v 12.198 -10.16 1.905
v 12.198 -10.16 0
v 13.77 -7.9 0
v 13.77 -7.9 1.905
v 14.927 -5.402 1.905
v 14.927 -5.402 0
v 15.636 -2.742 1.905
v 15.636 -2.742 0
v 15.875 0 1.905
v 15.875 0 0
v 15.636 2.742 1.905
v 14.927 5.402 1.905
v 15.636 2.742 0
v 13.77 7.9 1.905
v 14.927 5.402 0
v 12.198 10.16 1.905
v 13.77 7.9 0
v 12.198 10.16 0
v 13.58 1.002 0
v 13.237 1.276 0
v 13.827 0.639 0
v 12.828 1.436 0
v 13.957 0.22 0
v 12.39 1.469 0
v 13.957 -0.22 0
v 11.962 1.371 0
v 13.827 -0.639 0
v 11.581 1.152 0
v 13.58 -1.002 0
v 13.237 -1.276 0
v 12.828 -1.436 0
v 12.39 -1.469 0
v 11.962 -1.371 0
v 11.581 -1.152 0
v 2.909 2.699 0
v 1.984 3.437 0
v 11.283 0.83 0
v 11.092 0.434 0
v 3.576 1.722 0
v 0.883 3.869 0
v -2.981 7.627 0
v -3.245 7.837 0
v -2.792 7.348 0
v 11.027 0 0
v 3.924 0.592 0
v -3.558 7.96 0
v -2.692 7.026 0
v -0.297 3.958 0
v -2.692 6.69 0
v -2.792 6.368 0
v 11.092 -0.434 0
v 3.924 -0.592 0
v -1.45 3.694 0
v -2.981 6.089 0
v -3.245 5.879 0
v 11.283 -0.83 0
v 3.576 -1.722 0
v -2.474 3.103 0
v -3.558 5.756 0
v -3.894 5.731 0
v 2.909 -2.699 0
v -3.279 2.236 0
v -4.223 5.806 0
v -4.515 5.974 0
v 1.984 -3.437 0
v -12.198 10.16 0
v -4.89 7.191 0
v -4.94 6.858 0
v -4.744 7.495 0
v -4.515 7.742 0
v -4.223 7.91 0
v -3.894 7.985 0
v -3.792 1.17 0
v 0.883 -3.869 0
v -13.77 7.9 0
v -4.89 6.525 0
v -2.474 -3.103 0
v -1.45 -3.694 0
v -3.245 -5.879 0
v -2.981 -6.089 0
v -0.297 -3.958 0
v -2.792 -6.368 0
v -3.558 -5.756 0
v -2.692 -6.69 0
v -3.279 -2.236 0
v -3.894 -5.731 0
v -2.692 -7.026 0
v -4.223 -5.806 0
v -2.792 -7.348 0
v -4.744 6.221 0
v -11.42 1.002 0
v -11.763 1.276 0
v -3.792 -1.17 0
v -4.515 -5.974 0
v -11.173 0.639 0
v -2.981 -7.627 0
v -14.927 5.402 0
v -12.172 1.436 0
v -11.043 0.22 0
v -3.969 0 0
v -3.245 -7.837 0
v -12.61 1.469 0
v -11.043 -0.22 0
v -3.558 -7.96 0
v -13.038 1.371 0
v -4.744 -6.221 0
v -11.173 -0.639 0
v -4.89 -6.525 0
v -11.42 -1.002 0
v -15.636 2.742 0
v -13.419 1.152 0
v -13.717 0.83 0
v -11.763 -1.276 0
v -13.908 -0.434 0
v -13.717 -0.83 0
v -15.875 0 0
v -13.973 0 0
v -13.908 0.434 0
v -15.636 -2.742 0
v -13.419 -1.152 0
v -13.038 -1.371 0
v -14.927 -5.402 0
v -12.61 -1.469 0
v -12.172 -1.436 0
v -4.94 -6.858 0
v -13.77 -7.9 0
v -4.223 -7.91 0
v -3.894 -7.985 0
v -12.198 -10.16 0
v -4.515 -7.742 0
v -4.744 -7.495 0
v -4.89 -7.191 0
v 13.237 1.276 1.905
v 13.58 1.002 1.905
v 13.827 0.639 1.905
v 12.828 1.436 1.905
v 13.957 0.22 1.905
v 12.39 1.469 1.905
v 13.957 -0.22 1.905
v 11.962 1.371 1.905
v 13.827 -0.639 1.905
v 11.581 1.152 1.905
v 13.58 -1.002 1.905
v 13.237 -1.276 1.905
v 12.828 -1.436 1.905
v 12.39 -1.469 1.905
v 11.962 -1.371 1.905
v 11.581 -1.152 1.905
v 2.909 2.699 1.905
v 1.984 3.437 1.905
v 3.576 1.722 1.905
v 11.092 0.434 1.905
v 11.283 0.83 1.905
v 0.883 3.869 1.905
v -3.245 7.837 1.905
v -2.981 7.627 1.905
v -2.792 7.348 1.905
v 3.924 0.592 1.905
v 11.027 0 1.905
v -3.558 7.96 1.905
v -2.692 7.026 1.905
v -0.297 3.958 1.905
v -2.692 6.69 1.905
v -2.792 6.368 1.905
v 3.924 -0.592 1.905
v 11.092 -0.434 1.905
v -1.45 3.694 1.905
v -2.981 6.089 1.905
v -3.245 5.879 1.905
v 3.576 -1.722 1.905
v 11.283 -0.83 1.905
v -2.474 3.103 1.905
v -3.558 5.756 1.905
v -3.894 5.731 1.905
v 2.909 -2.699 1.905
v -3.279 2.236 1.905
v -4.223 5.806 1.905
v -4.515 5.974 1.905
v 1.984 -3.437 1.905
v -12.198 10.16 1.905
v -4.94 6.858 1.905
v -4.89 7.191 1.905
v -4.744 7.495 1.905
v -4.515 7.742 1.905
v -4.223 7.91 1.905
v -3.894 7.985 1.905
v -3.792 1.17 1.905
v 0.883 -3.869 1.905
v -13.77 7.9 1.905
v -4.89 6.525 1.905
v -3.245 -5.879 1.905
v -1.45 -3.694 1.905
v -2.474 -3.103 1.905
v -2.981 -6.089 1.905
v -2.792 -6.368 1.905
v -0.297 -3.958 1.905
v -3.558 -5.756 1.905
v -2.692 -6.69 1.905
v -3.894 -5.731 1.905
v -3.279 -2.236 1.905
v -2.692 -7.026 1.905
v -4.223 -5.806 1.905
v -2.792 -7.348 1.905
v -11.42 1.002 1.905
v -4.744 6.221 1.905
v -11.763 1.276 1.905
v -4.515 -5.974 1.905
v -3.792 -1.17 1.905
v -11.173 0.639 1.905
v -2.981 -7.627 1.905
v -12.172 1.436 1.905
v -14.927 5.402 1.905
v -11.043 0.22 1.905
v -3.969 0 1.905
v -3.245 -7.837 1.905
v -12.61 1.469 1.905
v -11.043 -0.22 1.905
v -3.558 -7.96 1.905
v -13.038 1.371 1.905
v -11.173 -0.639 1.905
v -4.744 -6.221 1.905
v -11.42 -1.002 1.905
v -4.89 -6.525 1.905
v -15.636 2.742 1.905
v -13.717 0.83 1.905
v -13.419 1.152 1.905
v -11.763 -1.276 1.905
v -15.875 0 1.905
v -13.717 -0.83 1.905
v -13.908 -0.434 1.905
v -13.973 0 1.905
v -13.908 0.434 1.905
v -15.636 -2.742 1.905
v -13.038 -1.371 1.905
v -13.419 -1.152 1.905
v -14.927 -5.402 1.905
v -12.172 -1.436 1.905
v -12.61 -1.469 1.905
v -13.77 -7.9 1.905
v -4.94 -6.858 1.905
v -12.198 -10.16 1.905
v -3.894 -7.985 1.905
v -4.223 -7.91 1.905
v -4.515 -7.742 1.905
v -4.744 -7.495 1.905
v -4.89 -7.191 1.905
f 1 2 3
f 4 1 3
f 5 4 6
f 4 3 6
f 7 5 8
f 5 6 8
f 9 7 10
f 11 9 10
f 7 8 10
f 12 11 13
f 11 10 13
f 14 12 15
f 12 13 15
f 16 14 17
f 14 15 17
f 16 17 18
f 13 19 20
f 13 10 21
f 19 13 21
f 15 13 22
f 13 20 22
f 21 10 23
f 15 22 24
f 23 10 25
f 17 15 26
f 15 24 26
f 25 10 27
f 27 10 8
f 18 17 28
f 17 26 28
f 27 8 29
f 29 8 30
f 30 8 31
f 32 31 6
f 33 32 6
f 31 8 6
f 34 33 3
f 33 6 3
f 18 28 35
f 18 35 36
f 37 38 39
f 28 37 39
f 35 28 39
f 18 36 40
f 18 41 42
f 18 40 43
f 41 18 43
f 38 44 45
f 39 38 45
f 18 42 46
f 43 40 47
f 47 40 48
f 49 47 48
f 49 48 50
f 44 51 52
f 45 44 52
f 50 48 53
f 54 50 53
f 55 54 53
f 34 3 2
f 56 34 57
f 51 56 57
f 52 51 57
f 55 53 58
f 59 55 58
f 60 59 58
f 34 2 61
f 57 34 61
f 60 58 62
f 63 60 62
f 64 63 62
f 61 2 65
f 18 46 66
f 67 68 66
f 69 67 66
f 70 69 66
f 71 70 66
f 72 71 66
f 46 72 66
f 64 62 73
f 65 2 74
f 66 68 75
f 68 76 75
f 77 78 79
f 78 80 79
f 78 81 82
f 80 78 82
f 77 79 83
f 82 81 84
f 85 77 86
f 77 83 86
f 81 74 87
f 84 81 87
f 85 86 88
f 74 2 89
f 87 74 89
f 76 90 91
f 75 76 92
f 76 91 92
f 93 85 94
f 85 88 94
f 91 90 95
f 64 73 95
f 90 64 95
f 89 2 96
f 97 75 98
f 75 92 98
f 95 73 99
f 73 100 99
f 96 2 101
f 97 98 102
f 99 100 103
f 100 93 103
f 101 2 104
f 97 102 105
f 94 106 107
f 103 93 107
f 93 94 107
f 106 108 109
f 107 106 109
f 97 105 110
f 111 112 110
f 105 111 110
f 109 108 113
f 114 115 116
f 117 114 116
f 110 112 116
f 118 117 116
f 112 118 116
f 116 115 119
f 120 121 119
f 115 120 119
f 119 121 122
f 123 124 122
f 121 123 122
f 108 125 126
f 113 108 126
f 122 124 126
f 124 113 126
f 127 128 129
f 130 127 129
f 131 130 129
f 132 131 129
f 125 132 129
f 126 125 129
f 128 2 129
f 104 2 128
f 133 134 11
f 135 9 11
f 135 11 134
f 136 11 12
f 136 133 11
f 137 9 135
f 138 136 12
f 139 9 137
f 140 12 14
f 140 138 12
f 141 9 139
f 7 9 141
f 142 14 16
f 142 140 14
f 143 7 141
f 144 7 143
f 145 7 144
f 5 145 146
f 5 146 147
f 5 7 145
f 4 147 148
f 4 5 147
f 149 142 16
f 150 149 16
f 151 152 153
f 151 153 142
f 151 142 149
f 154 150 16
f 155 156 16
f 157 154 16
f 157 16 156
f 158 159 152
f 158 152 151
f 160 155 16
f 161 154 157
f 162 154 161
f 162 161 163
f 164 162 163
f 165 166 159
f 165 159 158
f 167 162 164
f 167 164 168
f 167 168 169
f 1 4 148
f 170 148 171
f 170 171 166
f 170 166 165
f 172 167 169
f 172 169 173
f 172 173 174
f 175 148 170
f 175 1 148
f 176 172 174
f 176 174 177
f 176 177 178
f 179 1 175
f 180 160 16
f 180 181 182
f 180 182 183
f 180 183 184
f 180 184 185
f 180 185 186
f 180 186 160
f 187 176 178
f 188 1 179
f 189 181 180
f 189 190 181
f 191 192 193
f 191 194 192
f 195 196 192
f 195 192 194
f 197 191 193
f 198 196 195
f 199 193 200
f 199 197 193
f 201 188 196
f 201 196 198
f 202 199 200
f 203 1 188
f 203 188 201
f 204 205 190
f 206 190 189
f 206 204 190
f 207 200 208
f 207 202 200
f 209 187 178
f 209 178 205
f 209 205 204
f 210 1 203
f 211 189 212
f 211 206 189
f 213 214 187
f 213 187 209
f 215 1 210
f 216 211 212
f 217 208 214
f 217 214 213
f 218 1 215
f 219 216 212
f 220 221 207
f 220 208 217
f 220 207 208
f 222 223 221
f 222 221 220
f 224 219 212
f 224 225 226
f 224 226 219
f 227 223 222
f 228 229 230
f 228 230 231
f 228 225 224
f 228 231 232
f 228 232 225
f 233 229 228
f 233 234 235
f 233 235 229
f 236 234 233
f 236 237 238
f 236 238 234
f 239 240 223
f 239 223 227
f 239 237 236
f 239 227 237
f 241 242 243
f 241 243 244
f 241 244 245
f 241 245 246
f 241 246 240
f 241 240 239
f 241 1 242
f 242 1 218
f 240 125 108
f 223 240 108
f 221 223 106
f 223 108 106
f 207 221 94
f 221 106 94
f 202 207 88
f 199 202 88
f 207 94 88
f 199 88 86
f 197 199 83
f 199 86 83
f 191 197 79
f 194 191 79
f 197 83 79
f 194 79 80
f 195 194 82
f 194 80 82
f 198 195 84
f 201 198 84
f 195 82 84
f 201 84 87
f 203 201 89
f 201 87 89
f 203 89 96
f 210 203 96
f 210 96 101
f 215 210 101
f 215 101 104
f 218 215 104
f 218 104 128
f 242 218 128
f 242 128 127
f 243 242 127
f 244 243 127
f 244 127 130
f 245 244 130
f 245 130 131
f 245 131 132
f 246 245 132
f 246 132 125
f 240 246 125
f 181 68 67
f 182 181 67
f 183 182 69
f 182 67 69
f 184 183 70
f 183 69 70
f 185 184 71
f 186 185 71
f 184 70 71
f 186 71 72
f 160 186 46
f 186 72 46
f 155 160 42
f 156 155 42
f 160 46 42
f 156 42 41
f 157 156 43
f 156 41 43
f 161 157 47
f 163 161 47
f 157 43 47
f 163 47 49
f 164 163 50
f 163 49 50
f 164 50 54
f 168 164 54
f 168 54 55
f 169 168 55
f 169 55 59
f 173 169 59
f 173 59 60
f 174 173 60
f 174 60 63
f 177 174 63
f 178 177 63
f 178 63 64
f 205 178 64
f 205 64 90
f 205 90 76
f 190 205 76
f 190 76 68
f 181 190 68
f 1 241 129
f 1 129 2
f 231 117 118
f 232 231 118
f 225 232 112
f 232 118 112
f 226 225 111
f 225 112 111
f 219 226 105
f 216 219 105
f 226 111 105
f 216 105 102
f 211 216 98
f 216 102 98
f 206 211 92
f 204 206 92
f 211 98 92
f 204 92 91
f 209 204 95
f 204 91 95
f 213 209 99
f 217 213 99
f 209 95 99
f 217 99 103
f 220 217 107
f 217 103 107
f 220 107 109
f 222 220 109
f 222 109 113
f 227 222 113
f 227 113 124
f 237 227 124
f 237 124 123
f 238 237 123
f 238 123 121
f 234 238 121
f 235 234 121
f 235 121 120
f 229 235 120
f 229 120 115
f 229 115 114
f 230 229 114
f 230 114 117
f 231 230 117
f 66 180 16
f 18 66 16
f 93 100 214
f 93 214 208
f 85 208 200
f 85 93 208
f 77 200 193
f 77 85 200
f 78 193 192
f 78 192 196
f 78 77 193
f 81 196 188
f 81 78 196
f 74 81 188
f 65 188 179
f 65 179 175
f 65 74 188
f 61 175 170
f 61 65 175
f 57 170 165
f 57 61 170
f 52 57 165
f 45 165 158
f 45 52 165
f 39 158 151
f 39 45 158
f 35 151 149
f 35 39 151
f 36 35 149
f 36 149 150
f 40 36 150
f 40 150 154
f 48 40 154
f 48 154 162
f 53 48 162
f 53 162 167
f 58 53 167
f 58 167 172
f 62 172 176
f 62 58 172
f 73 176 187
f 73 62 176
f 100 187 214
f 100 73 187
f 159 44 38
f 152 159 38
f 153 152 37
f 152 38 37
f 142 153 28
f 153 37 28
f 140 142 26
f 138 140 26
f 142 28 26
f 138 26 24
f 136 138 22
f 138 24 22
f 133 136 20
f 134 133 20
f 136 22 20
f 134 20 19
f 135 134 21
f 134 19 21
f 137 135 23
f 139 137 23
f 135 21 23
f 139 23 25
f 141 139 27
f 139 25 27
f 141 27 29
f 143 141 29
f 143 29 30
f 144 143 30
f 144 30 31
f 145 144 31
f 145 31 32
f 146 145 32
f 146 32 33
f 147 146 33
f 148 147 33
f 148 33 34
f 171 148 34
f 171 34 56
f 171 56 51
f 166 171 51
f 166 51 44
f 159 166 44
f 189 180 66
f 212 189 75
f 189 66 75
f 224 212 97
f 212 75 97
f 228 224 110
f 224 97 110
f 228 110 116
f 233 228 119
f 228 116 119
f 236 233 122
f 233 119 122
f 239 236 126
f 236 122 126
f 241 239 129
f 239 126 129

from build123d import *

# Parameters (mm, degrees)
SKETCH1_R             = 15.875
SKETCH1_R_2           = 3.96875
BOSS_EXTRUDE1_DEPTH   = 1.905
MOTORCLEARANCEHOLES_D = 2.9464
ENCODERSETSCREWS_D    = 2.2606
LINACTCUTAWAY_DEPTH   = 23.531317649


with BuildPart() as part:
    # Sketch1 → Boss-Extrude1 (new body)
    with BuildSketch(Plane.XY):
        with Locations(Location((0, 0, 0), (0, 0, 180))):
            Circle(SKETCH1_R)
        with Locations(Location((0, 0, 0), (0, 0, 180))):
            Circle(SKETCH1_R_2, mode=Mode.SUBTRACT)
    extrude(amount=BOSS_EXTRUDE1_DEPTH)

    # MotorClearanceHoles (through all)
    with Locations(Plane.XY.offset(1.905)):
        with Locations((-12.5, 0), (12.5, 0)):
            Hole(MOTORCLEARANCEHOLES_D / 2)

    # EncoderSetScrews (through all)
    with Locations(Plane.XY.offset(1.905)):
        with Locations((-3.81, 6.858), (-3.81, -6.858)):
            Hole(ENCODERSETSCREWS_D / 2)

    # Sketch8 → LinActCutaway (cut, through all)
    with BuildSketch(Plane.XY.offset(1.905)):
        with BuildLine():
            Line((-12.197951672, -10.16), (12.197951672, -10.16))
            ThreePointArc((12.197951672, -10.16), (0, -15.875), (-12.197951672, -10.16))
        make_face()
        with BuildLine():
            Line((-12.197951672, 10.16), (12.197951672, 10.16))
            ThreePointArc((12.197951672, 10.16), (0, 15.875), (-12.197951672, 10.16))
        make_face()
    extrude(amount=-LINACTCUTAWAY_DEPTH, mode=Mode.SUBTRACT)


solid = part.part
